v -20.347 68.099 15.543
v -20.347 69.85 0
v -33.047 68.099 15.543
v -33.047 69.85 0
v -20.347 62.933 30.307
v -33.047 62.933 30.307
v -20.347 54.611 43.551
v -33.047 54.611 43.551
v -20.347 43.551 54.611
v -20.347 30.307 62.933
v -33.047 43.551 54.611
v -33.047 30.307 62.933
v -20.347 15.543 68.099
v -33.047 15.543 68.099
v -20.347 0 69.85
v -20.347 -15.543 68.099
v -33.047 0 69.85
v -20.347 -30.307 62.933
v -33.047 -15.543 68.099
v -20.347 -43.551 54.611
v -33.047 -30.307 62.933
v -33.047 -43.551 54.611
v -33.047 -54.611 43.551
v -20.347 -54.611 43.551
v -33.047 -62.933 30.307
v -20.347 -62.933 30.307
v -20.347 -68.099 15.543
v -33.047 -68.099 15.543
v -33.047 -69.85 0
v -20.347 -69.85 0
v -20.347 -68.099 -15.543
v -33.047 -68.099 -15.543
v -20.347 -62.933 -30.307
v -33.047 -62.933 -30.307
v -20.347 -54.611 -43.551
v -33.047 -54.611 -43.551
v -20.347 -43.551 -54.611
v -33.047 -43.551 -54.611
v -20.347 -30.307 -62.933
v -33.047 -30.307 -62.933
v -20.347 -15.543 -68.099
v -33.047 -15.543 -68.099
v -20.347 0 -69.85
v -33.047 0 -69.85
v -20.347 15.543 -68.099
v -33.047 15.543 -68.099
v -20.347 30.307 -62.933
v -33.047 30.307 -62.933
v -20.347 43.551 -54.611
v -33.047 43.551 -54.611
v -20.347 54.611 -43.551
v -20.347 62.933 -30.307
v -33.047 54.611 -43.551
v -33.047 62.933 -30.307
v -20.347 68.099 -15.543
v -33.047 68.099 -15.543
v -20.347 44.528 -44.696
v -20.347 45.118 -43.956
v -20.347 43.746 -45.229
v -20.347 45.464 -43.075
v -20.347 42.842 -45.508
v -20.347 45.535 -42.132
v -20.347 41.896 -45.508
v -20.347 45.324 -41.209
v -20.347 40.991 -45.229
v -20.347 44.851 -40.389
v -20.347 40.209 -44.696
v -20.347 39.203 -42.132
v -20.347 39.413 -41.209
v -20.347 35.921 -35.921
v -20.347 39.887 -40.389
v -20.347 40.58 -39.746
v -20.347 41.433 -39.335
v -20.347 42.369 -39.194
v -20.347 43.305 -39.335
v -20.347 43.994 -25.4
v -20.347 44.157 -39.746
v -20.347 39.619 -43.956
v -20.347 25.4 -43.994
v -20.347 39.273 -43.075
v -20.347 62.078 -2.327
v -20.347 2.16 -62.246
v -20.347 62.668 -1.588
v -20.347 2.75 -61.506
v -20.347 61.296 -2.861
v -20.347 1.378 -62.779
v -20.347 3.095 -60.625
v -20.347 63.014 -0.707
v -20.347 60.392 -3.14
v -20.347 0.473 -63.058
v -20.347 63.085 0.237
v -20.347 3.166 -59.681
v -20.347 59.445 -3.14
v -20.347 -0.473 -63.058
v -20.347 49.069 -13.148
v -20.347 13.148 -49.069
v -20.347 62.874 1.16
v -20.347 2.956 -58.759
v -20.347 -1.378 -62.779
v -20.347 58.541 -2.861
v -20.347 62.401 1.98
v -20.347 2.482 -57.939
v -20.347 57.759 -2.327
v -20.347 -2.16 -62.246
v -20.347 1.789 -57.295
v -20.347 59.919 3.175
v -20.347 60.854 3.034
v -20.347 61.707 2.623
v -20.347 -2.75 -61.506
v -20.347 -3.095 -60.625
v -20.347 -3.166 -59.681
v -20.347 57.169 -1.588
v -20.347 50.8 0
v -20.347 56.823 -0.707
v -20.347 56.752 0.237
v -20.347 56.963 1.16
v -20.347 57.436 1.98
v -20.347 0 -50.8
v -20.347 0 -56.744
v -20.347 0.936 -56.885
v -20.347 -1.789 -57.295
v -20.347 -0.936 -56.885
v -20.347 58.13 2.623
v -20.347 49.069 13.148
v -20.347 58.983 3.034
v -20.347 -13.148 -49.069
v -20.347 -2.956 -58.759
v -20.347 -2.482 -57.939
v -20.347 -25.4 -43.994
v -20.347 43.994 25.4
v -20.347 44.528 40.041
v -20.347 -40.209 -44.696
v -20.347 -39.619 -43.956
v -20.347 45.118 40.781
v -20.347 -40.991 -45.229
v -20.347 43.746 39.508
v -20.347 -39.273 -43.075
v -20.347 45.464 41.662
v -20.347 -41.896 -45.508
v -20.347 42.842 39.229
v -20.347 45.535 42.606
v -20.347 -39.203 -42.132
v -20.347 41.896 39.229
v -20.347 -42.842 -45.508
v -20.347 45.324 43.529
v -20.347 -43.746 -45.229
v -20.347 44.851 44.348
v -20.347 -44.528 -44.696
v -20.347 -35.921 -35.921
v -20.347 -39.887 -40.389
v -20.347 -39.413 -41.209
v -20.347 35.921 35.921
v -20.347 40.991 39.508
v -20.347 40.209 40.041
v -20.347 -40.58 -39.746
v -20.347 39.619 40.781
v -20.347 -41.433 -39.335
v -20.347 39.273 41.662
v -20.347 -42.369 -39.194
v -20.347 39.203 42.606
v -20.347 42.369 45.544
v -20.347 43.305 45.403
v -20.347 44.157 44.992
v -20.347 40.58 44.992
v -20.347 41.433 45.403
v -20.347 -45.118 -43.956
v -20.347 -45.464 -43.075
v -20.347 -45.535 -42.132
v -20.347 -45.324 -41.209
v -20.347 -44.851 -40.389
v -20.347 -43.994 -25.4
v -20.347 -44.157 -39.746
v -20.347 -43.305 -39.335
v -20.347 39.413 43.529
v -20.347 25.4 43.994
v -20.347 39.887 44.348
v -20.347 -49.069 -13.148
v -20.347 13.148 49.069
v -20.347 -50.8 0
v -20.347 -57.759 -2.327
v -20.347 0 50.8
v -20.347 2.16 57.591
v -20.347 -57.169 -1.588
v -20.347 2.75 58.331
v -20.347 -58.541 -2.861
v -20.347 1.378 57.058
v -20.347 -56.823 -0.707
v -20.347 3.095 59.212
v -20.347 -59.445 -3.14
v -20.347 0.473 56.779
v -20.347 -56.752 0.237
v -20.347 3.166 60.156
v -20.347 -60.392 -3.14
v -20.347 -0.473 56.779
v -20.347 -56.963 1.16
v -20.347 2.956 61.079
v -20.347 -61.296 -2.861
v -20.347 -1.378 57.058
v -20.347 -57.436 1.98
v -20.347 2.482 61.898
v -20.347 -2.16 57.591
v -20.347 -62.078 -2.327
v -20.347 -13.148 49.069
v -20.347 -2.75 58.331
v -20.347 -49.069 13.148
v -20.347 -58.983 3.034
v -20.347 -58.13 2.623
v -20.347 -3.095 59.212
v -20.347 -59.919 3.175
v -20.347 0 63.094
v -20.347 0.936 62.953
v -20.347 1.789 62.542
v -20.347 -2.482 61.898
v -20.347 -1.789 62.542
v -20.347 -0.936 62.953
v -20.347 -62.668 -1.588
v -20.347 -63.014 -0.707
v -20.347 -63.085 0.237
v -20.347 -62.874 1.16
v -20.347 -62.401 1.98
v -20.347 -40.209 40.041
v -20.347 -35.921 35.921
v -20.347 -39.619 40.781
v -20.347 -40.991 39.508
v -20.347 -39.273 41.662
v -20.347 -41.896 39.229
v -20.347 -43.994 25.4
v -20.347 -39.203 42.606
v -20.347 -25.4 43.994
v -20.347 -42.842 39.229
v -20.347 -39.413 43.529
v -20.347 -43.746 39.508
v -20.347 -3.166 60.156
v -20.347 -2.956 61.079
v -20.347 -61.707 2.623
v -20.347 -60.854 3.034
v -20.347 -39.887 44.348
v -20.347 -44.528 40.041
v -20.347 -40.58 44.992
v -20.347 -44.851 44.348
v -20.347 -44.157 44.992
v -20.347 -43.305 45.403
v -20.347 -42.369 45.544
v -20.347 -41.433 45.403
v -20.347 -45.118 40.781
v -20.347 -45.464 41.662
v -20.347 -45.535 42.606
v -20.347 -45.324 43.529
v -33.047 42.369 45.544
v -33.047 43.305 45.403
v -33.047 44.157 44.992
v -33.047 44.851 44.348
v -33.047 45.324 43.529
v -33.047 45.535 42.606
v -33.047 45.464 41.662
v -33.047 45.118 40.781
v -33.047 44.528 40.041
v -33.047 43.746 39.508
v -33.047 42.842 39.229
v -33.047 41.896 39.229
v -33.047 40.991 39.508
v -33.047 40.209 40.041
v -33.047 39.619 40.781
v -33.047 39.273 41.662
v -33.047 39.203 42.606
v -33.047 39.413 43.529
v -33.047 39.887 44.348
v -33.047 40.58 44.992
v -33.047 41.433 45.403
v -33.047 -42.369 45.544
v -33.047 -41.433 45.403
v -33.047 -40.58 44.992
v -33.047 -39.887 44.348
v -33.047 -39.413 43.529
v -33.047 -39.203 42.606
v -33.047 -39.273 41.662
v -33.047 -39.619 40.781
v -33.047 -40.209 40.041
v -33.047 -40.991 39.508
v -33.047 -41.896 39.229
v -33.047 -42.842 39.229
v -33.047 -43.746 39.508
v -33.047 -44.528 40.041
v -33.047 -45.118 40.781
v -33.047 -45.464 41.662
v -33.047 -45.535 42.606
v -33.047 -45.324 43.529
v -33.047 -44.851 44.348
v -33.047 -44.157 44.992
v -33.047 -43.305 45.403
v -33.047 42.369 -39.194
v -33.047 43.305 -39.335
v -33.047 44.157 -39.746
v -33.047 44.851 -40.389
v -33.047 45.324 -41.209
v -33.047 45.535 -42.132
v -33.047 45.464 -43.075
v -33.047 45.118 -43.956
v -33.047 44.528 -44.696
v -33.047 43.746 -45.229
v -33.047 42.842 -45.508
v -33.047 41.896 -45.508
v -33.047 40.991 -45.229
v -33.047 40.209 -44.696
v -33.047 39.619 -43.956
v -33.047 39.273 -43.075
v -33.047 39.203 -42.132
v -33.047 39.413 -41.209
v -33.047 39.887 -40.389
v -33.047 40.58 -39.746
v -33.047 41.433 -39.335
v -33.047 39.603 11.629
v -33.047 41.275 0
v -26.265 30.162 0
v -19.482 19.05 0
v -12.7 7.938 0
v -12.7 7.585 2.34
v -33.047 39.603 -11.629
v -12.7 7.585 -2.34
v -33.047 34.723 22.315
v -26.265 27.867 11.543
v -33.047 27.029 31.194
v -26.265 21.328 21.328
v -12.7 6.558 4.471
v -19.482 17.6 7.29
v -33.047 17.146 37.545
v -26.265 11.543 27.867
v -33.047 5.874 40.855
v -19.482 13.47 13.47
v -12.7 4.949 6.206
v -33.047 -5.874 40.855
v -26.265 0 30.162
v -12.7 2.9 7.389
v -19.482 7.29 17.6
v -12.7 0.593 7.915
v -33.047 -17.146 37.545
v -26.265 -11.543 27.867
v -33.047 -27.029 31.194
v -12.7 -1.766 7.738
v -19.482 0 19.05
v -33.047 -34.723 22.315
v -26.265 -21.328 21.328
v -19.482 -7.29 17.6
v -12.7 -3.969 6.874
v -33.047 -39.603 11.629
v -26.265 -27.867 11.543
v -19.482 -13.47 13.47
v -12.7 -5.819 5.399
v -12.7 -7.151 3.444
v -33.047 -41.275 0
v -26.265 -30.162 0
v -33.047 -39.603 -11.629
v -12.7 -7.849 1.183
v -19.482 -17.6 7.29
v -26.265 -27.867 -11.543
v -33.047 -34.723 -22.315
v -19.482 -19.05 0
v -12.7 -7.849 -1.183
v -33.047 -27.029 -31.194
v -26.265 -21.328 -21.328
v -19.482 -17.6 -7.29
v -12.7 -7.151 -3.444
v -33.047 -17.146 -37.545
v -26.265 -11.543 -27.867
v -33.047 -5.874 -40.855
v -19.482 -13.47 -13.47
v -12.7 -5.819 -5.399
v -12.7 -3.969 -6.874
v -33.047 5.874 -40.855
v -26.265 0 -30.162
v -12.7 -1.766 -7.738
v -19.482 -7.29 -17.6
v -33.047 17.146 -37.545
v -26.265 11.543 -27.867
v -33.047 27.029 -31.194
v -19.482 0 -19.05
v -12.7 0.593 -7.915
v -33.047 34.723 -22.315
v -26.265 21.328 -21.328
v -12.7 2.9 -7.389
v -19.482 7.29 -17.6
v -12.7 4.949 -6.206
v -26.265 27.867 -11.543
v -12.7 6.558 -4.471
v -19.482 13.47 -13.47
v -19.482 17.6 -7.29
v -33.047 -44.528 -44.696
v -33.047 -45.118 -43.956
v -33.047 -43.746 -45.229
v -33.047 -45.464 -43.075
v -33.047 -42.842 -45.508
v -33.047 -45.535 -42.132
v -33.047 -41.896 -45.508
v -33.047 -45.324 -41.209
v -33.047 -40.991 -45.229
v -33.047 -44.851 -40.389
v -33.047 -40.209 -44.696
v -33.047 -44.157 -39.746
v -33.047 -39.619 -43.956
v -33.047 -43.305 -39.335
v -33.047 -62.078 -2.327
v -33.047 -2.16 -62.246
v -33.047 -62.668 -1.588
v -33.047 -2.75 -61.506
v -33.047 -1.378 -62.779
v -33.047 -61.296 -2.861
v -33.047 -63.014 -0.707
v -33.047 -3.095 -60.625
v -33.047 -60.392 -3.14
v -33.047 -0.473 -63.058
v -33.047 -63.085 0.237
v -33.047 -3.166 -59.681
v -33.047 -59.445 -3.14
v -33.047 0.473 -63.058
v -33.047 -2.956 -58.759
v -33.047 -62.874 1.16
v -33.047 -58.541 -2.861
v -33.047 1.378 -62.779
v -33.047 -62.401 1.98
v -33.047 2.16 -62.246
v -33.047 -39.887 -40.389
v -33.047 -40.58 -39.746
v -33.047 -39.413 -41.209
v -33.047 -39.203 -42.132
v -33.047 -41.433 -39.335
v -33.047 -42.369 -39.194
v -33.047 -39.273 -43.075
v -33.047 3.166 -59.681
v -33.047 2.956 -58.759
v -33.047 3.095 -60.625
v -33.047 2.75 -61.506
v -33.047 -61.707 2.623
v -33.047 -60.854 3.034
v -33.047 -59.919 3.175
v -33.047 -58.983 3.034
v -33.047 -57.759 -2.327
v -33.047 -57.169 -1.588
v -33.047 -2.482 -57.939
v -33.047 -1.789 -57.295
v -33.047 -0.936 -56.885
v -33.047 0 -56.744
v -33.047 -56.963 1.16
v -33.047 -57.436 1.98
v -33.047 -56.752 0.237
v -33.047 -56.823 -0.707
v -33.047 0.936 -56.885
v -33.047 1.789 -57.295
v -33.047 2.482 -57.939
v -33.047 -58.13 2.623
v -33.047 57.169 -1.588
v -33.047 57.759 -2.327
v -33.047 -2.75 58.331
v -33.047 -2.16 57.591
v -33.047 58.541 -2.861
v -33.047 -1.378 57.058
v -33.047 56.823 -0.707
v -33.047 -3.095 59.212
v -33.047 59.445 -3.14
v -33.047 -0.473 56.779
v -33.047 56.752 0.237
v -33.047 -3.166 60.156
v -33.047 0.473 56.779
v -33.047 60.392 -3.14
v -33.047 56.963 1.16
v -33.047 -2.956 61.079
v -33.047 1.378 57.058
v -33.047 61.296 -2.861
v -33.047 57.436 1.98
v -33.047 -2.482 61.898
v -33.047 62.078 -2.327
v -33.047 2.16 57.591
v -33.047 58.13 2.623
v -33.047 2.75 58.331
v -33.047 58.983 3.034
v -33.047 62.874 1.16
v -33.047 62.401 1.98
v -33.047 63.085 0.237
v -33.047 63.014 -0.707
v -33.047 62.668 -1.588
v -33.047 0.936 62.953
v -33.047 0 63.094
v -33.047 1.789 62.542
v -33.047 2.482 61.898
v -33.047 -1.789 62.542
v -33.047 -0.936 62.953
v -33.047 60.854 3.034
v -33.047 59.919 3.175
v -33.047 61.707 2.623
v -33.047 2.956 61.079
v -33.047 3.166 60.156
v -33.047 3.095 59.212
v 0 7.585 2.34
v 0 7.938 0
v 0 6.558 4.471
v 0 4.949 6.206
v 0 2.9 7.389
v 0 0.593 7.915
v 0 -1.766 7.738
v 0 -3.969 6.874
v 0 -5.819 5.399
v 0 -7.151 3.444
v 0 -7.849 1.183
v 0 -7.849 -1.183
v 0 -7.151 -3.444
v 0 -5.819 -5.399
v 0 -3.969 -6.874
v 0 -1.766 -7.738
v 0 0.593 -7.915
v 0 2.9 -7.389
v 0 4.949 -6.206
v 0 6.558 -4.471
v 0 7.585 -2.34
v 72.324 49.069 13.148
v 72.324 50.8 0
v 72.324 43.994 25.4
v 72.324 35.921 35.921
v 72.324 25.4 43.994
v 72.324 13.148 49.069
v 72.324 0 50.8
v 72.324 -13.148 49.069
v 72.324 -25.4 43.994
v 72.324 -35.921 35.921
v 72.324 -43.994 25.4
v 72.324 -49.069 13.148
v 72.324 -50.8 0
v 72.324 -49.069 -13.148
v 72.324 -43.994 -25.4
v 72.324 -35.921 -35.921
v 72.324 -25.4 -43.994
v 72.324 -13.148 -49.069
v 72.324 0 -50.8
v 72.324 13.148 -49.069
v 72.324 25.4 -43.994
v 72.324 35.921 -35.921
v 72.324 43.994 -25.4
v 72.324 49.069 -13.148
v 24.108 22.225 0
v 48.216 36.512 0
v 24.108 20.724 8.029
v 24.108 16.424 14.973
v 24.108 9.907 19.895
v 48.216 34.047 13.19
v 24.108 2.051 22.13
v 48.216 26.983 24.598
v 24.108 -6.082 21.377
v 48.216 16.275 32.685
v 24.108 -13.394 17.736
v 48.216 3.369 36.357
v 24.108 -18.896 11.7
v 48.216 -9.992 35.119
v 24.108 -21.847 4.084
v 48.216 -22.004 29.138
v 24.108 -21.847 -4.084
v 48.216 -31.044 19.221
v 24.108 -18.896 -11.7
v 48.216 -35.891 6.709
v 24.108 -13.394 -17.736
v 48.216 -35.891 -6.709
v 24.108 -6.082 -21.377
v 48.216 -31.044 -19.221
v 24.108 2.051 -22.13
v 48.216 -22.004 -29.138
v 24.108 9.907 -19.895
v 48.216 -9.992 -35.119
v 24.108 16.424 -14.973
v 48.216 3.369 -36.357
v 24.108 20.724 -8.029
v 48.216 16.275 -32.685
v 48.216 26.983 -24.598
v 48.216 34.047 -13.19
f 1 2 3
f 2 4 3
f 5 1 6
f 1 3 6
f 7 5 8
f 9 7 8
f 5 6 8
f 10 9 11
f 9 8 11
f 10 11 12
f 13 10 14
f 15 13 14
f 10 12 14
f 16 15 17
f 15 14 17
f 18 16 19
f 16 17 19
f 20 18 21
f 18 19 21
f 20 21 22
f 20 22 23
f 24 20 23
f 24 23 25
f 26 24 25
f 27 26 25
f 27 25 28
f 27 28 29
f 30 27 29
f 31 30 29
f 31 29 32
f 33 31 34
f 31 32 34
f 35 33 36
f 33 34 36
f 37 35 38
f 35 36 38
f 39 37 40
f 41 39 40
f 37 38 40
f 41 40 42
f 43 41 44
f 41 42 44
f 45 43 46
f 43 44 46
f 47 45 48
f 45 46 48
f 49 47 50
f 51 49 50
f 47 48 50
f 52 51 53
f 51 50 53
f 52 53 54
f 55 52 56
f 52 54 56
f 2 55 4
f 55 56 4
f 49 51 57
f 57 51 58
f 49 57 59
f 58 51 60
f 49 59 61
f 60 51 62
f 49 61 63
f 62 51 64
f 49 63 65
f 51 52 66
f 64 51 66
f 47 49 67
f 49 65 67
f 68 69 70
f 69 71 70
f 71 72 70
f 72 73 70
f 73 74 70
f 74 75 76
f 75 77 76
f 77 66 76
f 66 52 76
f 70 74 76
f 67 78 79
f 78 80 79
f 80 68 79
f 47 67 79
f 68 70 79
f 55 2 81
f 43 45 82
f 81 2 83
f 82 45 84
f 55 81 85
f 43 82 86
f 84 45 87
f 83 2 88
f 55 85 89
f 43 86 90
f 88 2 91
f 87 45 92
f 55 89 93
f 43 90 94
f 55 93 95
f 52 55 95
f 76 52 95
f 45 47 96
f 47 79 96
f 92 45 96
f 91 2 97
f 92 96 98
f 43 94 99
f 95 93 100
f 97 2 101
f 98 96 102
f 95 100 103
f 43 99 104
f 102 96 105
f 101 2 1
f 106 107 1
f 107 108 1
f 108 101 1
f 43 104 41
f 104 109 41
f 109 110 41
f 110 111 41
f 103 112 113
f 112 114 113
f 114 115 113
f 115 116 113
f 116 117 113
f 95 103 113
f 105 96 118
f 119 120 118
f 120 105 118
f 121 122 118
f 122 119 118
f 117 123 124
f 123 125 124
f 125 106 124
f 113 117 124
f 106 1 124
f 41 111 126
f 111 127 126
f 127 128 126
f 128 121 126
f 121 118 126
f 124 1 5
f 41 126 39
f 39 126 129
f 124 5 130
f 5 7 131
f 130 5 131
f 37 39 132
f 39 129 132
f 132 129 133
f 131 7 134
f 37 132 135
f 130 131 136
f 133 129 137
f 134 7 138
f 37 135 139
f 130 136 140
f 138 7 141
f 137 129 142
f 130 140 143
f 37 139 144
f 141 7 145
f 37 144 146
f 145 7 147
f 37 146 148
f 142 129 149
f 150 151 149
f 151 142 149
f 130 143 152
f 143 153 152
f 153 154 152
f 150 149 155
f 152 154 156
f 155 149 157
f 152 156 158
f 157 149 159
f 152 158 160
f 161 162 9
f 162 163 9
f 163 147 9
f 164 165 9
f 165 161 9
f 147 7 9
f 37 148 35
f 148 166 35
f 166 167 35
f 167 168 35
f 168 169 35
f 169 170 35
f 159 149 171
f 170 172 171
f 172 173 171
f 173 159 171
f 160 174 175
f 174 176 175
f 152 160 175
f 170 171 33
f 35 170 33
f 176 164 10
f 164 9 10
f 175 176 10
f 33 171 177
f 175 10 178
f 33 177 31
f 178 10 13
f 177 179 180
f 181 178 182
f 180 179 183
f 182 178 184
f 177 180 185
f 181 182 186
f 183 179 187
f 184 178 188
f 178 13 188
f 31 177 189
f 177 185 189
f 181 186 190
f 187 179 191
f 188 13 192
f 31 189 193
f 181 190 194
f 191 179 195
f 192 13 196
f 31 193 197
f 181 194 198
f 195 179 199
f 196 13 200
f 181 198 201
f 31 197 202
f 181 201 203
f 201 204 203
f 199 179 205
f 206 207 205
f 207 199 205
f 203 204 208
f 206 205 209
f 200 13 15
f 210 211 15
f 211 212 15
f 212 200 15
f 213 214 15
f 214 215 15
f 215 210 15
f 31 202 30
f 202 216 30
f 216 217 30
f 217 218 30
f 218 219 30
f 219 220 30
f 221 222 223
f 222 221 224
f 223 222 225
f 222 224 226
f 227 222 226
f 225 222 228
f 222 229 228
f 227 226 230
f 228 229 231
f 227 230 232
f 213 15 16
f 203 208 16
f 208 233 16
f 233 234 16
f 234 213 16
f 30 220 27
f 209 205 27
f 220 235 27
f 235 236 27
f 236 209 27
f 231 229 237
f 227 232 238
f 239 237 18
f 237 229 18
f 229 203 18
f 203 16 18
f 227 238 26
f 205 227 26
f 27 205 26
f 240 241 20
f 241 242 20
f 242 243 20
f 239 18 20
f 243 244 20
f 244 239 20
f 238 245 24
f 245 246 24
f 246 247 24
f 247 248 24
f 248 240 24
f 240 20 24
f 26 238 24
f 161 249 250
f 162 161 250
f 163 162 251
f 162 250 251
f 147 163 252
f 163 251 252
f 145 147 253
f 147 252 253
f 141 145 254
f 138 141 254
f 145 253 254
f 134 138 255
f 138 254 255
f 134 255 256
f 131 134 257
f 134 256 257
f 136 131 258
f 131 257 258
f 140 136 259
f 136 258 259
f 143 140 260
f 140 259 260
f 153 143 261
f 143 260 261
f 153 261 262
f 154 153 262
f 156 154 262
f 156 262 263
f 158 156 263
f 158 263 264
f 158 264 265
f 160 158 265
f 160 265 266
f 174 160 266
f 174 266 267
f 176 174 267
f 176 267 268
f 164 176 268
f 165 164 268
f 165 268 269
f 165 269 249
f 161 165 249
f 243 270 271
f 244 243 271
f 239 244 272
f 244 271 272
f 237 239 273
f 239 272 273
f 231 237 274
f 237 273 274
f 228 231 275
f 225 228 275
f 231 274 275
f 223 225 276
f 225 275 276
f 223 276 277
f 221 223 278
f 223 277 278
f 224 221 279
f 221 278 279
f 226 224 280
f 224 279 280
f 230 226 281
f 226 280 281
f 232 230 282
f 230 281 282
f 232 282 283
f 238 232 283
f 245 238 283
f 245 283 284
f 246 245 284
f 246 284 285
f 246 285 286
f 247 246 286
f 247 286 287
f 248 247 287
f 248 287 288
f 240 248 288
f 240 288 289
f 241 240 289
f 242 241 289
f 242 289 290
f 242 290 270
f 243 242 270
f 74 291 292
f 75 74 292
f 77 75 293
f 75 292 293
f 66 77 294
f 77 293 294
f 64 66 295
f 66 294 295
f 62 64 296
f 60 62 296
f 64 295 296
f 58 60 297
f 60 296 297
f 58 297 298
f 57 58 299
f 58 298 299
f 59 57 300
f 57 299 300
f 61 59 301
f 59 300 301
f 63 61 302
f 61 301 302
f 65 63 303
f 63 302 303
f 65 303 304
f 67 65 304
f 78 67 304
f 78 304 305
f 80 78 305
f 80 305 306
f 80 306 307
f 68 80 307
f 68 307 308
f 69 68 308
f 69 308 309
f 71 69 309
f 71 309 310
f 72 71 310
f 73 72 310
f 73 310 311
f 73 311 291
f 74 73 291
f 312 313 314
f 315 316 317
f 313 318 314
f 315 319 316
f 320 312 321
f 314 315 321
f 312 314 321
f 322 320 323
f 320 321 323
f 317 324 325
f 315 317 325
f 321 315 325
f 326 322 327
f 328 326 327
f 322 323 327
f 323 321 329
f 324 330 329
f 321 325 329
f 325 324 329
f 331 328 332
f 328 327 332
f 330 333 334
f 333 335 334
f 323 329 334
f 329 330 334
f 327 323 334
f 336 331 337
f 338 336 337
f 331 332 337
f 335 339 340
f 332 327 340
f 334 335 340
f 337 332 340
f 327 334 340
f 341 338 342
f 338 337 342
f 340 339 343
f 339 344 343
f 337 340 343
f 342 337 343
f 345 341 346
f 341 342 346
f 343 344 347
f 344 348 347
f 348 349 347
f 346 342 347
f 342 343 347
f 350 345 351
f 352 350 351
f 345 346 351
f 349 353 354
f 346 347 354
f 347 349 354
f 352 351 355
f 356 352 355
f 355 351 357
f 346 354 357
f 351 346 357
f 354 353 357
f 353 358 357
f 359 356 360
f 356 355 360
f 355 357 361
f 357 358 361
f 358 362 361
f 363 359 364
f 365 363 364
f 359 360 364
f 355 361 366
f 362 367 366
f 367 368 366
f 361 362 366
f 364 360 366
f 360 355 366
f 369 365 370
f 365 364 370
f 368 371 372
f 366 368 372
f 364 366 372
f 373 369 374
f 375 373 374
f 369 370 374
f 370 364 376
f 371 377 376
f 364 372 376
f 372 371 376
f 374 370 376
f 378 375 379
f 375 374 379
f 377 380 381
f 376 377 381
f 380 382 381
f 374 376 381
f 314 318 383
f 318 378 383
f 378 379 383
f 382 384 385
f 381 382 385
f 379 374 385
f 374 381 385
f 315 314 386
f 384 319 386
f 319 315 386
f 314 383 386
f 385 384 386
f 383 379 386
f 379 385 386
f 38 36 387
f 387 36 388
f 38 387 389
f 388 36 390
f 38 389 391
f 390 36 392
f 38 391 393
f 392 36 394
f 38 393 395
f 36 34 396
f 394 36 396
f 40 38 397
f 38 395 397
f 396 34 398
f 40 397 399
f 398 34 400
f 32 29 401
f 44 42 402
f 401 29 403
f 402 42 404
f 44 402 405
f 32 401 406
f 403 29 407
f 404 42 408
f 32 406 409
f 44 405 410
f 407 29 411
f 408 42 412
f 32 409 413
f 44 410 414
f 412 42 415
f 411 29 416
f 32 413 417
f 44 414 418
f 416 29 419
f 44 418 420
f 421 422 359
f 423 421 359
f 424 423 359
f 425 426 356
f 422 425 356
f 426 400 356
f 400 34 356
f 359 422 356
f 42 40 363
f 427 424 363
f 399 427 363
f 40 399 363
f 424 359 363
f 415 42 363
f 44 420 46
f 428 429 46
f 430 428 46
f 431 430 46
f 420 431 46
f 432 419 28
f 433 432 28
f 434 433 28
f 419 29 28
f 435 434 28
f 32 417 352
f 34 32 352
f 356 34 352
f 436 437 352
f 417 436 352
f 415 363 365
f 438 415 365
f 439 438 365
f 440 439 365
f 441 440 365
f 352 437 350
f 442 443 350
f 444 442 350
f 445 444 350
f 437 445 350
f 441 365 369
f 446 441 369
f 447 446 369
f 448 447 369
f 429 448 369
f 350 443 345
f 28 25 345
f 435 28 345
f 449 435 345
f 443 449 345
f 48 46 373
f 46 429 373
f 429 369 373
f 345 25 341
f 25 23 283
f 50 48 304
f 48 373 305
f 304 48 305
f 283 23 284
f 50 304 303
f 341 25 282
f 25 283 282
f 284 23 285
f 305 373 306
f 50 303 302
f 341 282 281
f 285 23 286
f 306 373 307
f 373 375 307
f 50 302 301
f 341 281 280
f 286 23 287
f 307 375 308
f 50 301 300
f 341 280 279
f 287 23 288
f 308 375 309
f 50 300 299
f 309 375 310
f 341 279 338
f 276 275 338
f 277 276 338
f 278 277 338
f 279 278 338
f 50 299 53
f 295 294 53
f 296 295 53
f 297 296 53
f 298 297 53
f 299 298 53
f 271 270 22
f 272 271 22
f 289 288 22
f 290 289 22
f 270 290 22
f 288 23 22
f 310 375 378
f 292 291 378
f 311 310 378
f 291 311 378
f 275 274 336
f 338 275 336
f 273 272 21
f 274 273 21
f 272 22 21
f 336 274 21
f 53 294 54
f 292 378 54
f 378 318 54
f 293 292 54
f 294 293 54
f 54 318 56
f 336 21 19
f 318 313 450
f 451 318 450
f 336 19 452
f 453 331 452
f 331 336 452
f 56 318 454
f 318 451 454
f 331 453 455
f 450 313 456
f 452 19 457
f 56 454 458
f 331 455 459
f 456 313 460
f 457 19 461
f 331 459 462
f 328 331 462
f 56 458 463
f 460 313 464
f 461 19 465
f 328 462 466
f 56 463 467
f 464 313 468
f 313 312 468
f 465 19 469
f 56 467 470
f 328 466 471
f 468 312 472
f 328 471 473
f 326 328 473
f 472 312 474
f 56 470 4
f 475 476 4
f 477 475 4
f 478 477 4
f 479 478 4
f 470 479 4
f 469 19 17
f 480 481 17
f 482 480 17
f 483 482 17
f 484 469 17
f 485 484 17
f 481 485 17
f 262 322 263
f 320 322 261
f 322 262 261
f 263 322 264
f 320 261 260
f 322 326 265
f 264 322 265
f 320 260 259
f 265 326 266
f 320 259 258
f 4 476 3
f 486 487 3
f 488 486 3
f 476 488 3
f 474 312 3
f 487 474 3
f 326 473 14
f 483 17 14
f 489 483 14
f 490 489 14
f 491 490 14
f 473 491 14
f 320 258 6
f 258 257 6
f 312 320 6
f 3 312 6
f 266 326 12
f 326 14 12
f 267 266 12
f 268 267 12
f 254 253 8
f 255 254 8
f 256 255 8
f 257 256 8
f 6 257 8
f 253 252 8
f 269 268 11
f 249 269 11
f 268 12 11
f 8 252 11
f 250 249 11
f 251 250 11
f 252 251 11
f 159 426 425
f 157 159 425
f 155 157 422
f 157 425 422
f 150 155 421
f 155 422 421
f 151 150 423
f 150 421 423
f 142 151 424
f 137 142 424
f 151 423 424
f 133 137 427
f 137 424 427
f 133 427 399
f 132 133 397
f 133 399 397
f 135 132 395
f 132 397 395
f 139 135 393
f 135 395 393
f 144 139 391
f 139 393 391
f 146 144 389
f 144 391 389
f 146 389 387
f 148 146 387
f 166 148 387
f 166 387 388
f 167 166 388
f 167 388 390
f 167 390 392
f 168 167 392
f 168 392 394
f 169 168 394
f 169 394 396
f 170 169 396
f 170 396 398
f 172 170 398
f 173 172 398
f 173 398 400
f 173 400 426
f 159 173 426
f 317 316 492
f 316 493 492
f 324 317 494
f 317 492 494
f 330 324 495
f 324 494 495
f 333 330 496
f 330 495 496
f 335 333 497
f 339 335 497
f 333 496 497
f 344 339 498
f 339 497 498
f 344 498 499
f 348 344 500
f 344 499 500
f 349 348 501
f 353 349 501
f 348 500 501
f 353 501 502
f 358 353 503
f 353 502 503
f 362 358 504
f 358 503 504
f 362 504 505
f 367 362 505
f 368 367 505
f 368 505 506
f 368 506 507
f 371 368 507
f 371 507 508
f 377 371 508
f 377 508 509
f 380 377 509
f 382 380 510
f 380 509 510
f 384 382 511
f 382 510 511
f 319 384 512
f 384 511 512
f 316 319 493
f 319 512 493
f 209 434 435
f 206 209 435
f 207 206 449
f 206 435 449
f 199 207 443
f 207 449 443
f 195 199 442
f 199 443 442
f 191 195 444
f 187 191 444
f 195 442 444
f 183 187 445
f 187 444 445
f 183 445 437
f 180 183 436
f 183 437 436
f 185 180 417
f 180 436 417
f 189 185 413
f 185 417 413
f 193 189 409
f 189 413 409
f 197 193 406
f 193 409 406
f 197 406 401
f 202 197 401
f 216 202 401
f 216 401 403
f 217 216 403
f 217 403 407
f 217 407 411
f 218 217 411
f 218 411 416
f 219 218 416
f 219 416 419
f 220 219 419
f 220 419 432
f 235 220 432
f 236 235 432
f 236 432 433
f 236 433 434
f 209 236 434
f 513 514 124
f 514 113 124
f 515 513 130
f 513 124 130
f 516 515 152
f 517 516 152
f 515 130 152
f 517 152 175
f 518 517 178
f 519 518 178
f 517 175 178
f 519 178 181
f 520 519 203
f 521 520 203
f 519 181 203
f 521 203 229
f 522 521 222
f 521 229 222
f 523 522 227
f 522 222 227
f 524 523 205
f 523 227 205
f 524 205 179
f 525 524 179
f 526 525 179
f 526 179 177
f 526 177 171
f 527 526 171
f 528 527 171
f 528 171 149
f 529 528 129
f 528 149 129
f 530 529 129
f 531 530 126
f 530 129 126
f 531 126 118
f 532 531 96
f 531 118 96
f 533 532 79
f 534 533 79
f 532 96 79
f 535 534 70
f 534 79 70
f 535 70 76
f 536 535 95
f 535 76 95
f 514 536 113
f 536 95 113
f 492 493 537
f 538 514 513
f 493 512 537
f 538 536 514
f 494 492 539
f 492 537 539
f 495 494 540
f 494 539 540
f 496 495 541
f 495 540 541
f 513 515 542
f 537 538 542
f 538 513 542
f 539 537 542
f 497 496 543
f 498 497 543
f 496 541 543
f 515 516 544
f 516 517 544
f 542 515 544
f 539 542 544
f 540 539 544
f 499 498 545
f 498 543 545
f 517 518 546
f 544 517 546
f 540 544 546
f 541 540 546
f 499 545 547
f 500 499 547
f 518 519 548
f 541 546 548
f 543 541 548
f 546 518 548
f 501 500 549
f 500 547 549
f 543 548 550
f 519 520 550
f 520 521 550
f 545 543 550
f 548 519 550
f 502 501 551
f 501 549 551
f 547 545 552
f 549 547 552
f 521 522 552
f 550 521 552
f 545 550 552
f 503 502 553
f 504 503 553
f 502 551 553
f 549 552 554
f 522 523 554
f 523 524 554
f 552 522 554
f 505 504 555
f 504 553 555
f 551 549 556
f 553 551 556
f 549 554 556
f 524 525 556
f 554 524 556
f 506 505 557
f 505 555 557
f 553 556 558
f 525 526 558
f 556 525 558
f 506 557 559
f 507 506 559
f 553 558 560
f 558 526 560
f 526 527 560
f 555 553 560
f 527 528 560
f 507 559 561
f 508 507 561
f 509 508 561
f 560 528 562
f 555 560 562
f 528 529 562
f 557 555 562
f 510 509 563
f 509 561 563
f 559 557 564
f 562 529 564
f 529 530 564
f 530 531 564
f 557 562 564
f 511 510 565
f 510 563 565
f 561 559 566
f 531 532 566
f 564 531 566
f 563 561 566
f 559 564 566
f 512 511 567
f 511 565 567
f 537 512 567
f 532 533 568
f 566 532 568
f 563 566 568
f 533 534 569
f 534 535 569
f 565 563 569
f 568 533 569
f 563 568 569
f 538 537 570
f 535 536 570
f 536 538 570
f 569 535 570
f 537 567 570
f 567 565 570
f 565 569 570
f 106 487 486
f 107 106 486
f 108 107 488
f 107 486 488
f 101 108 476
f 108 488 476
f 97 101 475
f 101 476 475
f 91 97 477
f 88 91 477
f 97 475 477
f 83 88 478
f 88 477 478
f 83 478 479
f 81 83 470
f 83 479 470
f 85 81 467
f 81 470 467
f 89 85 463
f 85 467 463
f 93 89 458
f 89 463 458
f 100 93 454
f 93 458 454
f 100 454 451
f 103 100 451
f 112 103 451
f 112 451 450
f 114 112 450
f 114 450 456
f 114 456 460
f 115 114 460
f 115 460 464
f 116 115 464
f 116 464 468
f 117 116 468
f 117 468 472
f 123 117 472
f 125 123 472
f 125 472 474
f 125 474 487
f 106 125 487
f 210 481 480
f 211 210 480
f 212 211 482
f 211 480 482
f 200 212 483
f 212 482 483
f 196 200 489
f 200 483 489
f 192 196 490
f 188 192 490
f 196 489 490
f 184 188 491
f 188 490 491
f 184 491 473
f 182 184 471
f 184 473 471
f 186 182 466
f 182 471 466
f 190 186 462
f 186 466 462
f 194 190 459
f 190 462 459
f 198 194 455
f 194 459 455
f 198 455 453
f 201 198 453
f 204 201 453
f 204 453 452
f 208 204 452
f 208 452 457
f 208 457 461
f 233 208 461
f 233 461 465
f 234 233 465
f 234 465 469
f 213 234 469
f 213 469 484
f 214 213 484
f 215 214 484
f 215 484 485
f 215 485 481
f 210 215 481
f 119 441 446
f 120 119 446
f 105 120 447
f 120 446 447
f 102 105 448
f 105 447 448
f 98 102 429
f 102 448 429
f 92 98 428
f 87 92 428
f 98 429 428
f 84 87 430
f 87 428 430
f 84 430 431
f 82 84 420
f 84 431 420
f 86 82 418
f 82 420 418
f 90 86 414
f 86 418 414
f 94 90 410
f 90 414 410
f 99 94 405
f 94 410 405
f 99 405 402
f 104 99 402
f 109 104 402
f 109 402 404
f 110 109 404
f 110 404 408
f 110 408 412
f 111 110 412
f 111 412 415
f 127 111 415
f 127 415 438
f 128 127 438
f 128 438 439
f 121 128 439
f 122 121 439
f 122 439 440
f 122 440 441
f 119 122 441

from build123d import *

# Parameters (mm, degrees)
CUT_EXTRUDE2_REACH = 107.371
SKETCH3_R          = 3.175


with BuildPart() as part:
    # Sketch1 → Revolve1 (revolve)
    with BuildSketch(Plane.XY):
        Polygon((0, 7.9375), (72.324156056, 50.8), (-20.347266862, 50.8), (-20.347266862, 69.85), (-33.047266862, 69.85), (-33.047266862, 50.8), (-33.047266862, 41.275), (-12.7, 7.9375), align=None)
    revolve(axis=Axis((0, 0, 0), (1, 0, 0)))

    # Sketch3 → Cut-Extrude2 (cut, up to next)
    with BuildSketch(Plane.ZY.offset(33.047266862), mode=Mode.PRIVATE) as cut_extrude2_sk1:
        with Locations((0, 59.9186)):
            Circle(SKETCH3_R)
    cut_extrude2_tool1 = extrude(cut_extrude2_sk1.sketch, amount=-CUT_EXTRUDE2_REACH, mode=Mode.PRIVATE) & part.part
    add(cut_extrude2_tool1.solids().sort_by_distance((-33.047267, 59.9186, 0))[0], mode=Mode.SUBTRACT)
    # Sketch3 → Cut-Extrude2 (cut, up to next)
    with BuildSketch(Plane.ZY.offset(33.047266862), mode=Mode.PRIVATE) as cut_extrude2_sk2:
        with Locations((42.368848379, 42.368848379)):
            Circle(SKETCH3_R)
    cut_extrude2_tool2 = extrude(cut_extrude2_sk2.sketch, amount=-CUT_EXTRUDE2_REACH, mode=Mode.PRIVATE) & part.part
    add(cut_extrude2_tool2.solids().sort_by_distance((-33.047267, 42.368848, 42.368848))[0], mode=Mode.SUBTRACT)
    # Sketch3 → Cut-Extrude2 (cut, up to next)
    with BuildSketch(Plane.ZY.offset(33.047266862), mode=Mode.PRIVATE) as cut_extrude2_sk3:
        with Locations((59.9186, 0)):
            Circle(SKETCH3_R)
    cut_extrude2_tool3 = extrude(cut_extrude2_sk3.sketch, amount=-CUT_EXTRUDE2_REACH, mode=Mode.PRIVATE) & part.part
    add(cut_extrude2_tool3.solids().sort_by_distance((-33.047267, 0, 59.9186))[0], mode=Mode.SUBTRACT)
    # Sketch3 → Cut-Extrude2 (cut, up to next)
    with BuildSketch(Plane.ZY.offset(33.047266862), mode=Mode.PRIVATE) as cut_extrude2_sk4:
        with Locations((42.368848379, -42.368848379)):
            Circle(SKETCH3_R)
    cut_extrude2_tool4 = extrude(cut_extrude2_sk4.sketch, amount=-CUT_EXTRUDE2_REACH, mode=Mode.PRIVATE) & part.part
    add(cut_extrude2_tool4.solids().sort_by_distance((-33.047267, -42.368848, 42.368848))[0], mode=Mode.SUBTRACT)
    # Sketch3 → Cut-Extrude2 (cut, up to next)
    with BuildSketch(Plane.ZY.offset(33.047266862), mode=Mode.PRIVATE) as cut_extrude2_sk5:
        with Locations((0, -59.9186)):
            Circle(SKETCH3_R)
    cut_extrude2_tool5 = extrude(cut_extrude2_sk5.sketch, amount=-CUT_EXTRUDE2_REACH, mode=Mode.PRIVATE) & part.part
    add(cut_extrude2_tool5.solids().sort_by_distance((-33.047267, -59.9186, 0))[0], mode=Mode.SUBTRACT)
    # Sketch3 → Cut-Extrude2 (cut, up to next)
    with BuildSketch(Plane.ZY.offset(33.047266862), mode=Mode.PRIVATE) as cut_extrude2_sk6:
        with Locations((-42.368848379, -42.368848379)):
            Circle(SKETCH3_R)
    cut_extrude2_tool6 = extrude(cut_extrude2_sk6.sketch, amount=-CUT_EXTRUDE2_REACH, mode=Mode.PRIVATE) & part.part
    add(cut_extrude2_tool6.solids().sort_by_distance((-33.047267, -42.368848, -42.368848))[0], mode=Mode.SUBTRACT)
    # Sketch3 → Cut-Extrude2 (cut, up to next)
    with BuildSketch(Plane.ZY.offset(33.047266862), mode=Mode.PRIVATE) as cut_extrude2_sk7:
        with Locations((-59.9186, 0)):
            Circle(SKETCH3_R)
    cut_extrude2_tool7 = extrude(cut_extrude2_sk7.sketch, amount=-CUT_EXTRUDE2_REACH, mode=Mode.PRIVATE) & part.part
    add(cut_extrude2_tool7.solids().sort_by_distance((-33.047267, 0, -59.9186))[0], mode=Mode.SUBTRACT)
    # Sketch3 → Cut-Extrude2 (cut, up to next)
    with BuildSketch(Plane.ZY.offset(33.047266862), mode=Mode.PRIVATE) as cut_extrude2_sk8:
        with Locations((-42.368848379, 42.368848379)):
            Circle(SKETCH3_R)
    cut_extrude2_tool8 = extrude(cut_extrude2_sk8.sketch, amount=-CUT_EXTRUDE2_REACH, mode=Mode.PRIVATE) & part.part
    add(cut_extrude2_tool8.solids().sort_by_distance((-33.047267, 42.368848, -42.368848))[0], mode=Mode.SUBTRACT)


solid = part.part
